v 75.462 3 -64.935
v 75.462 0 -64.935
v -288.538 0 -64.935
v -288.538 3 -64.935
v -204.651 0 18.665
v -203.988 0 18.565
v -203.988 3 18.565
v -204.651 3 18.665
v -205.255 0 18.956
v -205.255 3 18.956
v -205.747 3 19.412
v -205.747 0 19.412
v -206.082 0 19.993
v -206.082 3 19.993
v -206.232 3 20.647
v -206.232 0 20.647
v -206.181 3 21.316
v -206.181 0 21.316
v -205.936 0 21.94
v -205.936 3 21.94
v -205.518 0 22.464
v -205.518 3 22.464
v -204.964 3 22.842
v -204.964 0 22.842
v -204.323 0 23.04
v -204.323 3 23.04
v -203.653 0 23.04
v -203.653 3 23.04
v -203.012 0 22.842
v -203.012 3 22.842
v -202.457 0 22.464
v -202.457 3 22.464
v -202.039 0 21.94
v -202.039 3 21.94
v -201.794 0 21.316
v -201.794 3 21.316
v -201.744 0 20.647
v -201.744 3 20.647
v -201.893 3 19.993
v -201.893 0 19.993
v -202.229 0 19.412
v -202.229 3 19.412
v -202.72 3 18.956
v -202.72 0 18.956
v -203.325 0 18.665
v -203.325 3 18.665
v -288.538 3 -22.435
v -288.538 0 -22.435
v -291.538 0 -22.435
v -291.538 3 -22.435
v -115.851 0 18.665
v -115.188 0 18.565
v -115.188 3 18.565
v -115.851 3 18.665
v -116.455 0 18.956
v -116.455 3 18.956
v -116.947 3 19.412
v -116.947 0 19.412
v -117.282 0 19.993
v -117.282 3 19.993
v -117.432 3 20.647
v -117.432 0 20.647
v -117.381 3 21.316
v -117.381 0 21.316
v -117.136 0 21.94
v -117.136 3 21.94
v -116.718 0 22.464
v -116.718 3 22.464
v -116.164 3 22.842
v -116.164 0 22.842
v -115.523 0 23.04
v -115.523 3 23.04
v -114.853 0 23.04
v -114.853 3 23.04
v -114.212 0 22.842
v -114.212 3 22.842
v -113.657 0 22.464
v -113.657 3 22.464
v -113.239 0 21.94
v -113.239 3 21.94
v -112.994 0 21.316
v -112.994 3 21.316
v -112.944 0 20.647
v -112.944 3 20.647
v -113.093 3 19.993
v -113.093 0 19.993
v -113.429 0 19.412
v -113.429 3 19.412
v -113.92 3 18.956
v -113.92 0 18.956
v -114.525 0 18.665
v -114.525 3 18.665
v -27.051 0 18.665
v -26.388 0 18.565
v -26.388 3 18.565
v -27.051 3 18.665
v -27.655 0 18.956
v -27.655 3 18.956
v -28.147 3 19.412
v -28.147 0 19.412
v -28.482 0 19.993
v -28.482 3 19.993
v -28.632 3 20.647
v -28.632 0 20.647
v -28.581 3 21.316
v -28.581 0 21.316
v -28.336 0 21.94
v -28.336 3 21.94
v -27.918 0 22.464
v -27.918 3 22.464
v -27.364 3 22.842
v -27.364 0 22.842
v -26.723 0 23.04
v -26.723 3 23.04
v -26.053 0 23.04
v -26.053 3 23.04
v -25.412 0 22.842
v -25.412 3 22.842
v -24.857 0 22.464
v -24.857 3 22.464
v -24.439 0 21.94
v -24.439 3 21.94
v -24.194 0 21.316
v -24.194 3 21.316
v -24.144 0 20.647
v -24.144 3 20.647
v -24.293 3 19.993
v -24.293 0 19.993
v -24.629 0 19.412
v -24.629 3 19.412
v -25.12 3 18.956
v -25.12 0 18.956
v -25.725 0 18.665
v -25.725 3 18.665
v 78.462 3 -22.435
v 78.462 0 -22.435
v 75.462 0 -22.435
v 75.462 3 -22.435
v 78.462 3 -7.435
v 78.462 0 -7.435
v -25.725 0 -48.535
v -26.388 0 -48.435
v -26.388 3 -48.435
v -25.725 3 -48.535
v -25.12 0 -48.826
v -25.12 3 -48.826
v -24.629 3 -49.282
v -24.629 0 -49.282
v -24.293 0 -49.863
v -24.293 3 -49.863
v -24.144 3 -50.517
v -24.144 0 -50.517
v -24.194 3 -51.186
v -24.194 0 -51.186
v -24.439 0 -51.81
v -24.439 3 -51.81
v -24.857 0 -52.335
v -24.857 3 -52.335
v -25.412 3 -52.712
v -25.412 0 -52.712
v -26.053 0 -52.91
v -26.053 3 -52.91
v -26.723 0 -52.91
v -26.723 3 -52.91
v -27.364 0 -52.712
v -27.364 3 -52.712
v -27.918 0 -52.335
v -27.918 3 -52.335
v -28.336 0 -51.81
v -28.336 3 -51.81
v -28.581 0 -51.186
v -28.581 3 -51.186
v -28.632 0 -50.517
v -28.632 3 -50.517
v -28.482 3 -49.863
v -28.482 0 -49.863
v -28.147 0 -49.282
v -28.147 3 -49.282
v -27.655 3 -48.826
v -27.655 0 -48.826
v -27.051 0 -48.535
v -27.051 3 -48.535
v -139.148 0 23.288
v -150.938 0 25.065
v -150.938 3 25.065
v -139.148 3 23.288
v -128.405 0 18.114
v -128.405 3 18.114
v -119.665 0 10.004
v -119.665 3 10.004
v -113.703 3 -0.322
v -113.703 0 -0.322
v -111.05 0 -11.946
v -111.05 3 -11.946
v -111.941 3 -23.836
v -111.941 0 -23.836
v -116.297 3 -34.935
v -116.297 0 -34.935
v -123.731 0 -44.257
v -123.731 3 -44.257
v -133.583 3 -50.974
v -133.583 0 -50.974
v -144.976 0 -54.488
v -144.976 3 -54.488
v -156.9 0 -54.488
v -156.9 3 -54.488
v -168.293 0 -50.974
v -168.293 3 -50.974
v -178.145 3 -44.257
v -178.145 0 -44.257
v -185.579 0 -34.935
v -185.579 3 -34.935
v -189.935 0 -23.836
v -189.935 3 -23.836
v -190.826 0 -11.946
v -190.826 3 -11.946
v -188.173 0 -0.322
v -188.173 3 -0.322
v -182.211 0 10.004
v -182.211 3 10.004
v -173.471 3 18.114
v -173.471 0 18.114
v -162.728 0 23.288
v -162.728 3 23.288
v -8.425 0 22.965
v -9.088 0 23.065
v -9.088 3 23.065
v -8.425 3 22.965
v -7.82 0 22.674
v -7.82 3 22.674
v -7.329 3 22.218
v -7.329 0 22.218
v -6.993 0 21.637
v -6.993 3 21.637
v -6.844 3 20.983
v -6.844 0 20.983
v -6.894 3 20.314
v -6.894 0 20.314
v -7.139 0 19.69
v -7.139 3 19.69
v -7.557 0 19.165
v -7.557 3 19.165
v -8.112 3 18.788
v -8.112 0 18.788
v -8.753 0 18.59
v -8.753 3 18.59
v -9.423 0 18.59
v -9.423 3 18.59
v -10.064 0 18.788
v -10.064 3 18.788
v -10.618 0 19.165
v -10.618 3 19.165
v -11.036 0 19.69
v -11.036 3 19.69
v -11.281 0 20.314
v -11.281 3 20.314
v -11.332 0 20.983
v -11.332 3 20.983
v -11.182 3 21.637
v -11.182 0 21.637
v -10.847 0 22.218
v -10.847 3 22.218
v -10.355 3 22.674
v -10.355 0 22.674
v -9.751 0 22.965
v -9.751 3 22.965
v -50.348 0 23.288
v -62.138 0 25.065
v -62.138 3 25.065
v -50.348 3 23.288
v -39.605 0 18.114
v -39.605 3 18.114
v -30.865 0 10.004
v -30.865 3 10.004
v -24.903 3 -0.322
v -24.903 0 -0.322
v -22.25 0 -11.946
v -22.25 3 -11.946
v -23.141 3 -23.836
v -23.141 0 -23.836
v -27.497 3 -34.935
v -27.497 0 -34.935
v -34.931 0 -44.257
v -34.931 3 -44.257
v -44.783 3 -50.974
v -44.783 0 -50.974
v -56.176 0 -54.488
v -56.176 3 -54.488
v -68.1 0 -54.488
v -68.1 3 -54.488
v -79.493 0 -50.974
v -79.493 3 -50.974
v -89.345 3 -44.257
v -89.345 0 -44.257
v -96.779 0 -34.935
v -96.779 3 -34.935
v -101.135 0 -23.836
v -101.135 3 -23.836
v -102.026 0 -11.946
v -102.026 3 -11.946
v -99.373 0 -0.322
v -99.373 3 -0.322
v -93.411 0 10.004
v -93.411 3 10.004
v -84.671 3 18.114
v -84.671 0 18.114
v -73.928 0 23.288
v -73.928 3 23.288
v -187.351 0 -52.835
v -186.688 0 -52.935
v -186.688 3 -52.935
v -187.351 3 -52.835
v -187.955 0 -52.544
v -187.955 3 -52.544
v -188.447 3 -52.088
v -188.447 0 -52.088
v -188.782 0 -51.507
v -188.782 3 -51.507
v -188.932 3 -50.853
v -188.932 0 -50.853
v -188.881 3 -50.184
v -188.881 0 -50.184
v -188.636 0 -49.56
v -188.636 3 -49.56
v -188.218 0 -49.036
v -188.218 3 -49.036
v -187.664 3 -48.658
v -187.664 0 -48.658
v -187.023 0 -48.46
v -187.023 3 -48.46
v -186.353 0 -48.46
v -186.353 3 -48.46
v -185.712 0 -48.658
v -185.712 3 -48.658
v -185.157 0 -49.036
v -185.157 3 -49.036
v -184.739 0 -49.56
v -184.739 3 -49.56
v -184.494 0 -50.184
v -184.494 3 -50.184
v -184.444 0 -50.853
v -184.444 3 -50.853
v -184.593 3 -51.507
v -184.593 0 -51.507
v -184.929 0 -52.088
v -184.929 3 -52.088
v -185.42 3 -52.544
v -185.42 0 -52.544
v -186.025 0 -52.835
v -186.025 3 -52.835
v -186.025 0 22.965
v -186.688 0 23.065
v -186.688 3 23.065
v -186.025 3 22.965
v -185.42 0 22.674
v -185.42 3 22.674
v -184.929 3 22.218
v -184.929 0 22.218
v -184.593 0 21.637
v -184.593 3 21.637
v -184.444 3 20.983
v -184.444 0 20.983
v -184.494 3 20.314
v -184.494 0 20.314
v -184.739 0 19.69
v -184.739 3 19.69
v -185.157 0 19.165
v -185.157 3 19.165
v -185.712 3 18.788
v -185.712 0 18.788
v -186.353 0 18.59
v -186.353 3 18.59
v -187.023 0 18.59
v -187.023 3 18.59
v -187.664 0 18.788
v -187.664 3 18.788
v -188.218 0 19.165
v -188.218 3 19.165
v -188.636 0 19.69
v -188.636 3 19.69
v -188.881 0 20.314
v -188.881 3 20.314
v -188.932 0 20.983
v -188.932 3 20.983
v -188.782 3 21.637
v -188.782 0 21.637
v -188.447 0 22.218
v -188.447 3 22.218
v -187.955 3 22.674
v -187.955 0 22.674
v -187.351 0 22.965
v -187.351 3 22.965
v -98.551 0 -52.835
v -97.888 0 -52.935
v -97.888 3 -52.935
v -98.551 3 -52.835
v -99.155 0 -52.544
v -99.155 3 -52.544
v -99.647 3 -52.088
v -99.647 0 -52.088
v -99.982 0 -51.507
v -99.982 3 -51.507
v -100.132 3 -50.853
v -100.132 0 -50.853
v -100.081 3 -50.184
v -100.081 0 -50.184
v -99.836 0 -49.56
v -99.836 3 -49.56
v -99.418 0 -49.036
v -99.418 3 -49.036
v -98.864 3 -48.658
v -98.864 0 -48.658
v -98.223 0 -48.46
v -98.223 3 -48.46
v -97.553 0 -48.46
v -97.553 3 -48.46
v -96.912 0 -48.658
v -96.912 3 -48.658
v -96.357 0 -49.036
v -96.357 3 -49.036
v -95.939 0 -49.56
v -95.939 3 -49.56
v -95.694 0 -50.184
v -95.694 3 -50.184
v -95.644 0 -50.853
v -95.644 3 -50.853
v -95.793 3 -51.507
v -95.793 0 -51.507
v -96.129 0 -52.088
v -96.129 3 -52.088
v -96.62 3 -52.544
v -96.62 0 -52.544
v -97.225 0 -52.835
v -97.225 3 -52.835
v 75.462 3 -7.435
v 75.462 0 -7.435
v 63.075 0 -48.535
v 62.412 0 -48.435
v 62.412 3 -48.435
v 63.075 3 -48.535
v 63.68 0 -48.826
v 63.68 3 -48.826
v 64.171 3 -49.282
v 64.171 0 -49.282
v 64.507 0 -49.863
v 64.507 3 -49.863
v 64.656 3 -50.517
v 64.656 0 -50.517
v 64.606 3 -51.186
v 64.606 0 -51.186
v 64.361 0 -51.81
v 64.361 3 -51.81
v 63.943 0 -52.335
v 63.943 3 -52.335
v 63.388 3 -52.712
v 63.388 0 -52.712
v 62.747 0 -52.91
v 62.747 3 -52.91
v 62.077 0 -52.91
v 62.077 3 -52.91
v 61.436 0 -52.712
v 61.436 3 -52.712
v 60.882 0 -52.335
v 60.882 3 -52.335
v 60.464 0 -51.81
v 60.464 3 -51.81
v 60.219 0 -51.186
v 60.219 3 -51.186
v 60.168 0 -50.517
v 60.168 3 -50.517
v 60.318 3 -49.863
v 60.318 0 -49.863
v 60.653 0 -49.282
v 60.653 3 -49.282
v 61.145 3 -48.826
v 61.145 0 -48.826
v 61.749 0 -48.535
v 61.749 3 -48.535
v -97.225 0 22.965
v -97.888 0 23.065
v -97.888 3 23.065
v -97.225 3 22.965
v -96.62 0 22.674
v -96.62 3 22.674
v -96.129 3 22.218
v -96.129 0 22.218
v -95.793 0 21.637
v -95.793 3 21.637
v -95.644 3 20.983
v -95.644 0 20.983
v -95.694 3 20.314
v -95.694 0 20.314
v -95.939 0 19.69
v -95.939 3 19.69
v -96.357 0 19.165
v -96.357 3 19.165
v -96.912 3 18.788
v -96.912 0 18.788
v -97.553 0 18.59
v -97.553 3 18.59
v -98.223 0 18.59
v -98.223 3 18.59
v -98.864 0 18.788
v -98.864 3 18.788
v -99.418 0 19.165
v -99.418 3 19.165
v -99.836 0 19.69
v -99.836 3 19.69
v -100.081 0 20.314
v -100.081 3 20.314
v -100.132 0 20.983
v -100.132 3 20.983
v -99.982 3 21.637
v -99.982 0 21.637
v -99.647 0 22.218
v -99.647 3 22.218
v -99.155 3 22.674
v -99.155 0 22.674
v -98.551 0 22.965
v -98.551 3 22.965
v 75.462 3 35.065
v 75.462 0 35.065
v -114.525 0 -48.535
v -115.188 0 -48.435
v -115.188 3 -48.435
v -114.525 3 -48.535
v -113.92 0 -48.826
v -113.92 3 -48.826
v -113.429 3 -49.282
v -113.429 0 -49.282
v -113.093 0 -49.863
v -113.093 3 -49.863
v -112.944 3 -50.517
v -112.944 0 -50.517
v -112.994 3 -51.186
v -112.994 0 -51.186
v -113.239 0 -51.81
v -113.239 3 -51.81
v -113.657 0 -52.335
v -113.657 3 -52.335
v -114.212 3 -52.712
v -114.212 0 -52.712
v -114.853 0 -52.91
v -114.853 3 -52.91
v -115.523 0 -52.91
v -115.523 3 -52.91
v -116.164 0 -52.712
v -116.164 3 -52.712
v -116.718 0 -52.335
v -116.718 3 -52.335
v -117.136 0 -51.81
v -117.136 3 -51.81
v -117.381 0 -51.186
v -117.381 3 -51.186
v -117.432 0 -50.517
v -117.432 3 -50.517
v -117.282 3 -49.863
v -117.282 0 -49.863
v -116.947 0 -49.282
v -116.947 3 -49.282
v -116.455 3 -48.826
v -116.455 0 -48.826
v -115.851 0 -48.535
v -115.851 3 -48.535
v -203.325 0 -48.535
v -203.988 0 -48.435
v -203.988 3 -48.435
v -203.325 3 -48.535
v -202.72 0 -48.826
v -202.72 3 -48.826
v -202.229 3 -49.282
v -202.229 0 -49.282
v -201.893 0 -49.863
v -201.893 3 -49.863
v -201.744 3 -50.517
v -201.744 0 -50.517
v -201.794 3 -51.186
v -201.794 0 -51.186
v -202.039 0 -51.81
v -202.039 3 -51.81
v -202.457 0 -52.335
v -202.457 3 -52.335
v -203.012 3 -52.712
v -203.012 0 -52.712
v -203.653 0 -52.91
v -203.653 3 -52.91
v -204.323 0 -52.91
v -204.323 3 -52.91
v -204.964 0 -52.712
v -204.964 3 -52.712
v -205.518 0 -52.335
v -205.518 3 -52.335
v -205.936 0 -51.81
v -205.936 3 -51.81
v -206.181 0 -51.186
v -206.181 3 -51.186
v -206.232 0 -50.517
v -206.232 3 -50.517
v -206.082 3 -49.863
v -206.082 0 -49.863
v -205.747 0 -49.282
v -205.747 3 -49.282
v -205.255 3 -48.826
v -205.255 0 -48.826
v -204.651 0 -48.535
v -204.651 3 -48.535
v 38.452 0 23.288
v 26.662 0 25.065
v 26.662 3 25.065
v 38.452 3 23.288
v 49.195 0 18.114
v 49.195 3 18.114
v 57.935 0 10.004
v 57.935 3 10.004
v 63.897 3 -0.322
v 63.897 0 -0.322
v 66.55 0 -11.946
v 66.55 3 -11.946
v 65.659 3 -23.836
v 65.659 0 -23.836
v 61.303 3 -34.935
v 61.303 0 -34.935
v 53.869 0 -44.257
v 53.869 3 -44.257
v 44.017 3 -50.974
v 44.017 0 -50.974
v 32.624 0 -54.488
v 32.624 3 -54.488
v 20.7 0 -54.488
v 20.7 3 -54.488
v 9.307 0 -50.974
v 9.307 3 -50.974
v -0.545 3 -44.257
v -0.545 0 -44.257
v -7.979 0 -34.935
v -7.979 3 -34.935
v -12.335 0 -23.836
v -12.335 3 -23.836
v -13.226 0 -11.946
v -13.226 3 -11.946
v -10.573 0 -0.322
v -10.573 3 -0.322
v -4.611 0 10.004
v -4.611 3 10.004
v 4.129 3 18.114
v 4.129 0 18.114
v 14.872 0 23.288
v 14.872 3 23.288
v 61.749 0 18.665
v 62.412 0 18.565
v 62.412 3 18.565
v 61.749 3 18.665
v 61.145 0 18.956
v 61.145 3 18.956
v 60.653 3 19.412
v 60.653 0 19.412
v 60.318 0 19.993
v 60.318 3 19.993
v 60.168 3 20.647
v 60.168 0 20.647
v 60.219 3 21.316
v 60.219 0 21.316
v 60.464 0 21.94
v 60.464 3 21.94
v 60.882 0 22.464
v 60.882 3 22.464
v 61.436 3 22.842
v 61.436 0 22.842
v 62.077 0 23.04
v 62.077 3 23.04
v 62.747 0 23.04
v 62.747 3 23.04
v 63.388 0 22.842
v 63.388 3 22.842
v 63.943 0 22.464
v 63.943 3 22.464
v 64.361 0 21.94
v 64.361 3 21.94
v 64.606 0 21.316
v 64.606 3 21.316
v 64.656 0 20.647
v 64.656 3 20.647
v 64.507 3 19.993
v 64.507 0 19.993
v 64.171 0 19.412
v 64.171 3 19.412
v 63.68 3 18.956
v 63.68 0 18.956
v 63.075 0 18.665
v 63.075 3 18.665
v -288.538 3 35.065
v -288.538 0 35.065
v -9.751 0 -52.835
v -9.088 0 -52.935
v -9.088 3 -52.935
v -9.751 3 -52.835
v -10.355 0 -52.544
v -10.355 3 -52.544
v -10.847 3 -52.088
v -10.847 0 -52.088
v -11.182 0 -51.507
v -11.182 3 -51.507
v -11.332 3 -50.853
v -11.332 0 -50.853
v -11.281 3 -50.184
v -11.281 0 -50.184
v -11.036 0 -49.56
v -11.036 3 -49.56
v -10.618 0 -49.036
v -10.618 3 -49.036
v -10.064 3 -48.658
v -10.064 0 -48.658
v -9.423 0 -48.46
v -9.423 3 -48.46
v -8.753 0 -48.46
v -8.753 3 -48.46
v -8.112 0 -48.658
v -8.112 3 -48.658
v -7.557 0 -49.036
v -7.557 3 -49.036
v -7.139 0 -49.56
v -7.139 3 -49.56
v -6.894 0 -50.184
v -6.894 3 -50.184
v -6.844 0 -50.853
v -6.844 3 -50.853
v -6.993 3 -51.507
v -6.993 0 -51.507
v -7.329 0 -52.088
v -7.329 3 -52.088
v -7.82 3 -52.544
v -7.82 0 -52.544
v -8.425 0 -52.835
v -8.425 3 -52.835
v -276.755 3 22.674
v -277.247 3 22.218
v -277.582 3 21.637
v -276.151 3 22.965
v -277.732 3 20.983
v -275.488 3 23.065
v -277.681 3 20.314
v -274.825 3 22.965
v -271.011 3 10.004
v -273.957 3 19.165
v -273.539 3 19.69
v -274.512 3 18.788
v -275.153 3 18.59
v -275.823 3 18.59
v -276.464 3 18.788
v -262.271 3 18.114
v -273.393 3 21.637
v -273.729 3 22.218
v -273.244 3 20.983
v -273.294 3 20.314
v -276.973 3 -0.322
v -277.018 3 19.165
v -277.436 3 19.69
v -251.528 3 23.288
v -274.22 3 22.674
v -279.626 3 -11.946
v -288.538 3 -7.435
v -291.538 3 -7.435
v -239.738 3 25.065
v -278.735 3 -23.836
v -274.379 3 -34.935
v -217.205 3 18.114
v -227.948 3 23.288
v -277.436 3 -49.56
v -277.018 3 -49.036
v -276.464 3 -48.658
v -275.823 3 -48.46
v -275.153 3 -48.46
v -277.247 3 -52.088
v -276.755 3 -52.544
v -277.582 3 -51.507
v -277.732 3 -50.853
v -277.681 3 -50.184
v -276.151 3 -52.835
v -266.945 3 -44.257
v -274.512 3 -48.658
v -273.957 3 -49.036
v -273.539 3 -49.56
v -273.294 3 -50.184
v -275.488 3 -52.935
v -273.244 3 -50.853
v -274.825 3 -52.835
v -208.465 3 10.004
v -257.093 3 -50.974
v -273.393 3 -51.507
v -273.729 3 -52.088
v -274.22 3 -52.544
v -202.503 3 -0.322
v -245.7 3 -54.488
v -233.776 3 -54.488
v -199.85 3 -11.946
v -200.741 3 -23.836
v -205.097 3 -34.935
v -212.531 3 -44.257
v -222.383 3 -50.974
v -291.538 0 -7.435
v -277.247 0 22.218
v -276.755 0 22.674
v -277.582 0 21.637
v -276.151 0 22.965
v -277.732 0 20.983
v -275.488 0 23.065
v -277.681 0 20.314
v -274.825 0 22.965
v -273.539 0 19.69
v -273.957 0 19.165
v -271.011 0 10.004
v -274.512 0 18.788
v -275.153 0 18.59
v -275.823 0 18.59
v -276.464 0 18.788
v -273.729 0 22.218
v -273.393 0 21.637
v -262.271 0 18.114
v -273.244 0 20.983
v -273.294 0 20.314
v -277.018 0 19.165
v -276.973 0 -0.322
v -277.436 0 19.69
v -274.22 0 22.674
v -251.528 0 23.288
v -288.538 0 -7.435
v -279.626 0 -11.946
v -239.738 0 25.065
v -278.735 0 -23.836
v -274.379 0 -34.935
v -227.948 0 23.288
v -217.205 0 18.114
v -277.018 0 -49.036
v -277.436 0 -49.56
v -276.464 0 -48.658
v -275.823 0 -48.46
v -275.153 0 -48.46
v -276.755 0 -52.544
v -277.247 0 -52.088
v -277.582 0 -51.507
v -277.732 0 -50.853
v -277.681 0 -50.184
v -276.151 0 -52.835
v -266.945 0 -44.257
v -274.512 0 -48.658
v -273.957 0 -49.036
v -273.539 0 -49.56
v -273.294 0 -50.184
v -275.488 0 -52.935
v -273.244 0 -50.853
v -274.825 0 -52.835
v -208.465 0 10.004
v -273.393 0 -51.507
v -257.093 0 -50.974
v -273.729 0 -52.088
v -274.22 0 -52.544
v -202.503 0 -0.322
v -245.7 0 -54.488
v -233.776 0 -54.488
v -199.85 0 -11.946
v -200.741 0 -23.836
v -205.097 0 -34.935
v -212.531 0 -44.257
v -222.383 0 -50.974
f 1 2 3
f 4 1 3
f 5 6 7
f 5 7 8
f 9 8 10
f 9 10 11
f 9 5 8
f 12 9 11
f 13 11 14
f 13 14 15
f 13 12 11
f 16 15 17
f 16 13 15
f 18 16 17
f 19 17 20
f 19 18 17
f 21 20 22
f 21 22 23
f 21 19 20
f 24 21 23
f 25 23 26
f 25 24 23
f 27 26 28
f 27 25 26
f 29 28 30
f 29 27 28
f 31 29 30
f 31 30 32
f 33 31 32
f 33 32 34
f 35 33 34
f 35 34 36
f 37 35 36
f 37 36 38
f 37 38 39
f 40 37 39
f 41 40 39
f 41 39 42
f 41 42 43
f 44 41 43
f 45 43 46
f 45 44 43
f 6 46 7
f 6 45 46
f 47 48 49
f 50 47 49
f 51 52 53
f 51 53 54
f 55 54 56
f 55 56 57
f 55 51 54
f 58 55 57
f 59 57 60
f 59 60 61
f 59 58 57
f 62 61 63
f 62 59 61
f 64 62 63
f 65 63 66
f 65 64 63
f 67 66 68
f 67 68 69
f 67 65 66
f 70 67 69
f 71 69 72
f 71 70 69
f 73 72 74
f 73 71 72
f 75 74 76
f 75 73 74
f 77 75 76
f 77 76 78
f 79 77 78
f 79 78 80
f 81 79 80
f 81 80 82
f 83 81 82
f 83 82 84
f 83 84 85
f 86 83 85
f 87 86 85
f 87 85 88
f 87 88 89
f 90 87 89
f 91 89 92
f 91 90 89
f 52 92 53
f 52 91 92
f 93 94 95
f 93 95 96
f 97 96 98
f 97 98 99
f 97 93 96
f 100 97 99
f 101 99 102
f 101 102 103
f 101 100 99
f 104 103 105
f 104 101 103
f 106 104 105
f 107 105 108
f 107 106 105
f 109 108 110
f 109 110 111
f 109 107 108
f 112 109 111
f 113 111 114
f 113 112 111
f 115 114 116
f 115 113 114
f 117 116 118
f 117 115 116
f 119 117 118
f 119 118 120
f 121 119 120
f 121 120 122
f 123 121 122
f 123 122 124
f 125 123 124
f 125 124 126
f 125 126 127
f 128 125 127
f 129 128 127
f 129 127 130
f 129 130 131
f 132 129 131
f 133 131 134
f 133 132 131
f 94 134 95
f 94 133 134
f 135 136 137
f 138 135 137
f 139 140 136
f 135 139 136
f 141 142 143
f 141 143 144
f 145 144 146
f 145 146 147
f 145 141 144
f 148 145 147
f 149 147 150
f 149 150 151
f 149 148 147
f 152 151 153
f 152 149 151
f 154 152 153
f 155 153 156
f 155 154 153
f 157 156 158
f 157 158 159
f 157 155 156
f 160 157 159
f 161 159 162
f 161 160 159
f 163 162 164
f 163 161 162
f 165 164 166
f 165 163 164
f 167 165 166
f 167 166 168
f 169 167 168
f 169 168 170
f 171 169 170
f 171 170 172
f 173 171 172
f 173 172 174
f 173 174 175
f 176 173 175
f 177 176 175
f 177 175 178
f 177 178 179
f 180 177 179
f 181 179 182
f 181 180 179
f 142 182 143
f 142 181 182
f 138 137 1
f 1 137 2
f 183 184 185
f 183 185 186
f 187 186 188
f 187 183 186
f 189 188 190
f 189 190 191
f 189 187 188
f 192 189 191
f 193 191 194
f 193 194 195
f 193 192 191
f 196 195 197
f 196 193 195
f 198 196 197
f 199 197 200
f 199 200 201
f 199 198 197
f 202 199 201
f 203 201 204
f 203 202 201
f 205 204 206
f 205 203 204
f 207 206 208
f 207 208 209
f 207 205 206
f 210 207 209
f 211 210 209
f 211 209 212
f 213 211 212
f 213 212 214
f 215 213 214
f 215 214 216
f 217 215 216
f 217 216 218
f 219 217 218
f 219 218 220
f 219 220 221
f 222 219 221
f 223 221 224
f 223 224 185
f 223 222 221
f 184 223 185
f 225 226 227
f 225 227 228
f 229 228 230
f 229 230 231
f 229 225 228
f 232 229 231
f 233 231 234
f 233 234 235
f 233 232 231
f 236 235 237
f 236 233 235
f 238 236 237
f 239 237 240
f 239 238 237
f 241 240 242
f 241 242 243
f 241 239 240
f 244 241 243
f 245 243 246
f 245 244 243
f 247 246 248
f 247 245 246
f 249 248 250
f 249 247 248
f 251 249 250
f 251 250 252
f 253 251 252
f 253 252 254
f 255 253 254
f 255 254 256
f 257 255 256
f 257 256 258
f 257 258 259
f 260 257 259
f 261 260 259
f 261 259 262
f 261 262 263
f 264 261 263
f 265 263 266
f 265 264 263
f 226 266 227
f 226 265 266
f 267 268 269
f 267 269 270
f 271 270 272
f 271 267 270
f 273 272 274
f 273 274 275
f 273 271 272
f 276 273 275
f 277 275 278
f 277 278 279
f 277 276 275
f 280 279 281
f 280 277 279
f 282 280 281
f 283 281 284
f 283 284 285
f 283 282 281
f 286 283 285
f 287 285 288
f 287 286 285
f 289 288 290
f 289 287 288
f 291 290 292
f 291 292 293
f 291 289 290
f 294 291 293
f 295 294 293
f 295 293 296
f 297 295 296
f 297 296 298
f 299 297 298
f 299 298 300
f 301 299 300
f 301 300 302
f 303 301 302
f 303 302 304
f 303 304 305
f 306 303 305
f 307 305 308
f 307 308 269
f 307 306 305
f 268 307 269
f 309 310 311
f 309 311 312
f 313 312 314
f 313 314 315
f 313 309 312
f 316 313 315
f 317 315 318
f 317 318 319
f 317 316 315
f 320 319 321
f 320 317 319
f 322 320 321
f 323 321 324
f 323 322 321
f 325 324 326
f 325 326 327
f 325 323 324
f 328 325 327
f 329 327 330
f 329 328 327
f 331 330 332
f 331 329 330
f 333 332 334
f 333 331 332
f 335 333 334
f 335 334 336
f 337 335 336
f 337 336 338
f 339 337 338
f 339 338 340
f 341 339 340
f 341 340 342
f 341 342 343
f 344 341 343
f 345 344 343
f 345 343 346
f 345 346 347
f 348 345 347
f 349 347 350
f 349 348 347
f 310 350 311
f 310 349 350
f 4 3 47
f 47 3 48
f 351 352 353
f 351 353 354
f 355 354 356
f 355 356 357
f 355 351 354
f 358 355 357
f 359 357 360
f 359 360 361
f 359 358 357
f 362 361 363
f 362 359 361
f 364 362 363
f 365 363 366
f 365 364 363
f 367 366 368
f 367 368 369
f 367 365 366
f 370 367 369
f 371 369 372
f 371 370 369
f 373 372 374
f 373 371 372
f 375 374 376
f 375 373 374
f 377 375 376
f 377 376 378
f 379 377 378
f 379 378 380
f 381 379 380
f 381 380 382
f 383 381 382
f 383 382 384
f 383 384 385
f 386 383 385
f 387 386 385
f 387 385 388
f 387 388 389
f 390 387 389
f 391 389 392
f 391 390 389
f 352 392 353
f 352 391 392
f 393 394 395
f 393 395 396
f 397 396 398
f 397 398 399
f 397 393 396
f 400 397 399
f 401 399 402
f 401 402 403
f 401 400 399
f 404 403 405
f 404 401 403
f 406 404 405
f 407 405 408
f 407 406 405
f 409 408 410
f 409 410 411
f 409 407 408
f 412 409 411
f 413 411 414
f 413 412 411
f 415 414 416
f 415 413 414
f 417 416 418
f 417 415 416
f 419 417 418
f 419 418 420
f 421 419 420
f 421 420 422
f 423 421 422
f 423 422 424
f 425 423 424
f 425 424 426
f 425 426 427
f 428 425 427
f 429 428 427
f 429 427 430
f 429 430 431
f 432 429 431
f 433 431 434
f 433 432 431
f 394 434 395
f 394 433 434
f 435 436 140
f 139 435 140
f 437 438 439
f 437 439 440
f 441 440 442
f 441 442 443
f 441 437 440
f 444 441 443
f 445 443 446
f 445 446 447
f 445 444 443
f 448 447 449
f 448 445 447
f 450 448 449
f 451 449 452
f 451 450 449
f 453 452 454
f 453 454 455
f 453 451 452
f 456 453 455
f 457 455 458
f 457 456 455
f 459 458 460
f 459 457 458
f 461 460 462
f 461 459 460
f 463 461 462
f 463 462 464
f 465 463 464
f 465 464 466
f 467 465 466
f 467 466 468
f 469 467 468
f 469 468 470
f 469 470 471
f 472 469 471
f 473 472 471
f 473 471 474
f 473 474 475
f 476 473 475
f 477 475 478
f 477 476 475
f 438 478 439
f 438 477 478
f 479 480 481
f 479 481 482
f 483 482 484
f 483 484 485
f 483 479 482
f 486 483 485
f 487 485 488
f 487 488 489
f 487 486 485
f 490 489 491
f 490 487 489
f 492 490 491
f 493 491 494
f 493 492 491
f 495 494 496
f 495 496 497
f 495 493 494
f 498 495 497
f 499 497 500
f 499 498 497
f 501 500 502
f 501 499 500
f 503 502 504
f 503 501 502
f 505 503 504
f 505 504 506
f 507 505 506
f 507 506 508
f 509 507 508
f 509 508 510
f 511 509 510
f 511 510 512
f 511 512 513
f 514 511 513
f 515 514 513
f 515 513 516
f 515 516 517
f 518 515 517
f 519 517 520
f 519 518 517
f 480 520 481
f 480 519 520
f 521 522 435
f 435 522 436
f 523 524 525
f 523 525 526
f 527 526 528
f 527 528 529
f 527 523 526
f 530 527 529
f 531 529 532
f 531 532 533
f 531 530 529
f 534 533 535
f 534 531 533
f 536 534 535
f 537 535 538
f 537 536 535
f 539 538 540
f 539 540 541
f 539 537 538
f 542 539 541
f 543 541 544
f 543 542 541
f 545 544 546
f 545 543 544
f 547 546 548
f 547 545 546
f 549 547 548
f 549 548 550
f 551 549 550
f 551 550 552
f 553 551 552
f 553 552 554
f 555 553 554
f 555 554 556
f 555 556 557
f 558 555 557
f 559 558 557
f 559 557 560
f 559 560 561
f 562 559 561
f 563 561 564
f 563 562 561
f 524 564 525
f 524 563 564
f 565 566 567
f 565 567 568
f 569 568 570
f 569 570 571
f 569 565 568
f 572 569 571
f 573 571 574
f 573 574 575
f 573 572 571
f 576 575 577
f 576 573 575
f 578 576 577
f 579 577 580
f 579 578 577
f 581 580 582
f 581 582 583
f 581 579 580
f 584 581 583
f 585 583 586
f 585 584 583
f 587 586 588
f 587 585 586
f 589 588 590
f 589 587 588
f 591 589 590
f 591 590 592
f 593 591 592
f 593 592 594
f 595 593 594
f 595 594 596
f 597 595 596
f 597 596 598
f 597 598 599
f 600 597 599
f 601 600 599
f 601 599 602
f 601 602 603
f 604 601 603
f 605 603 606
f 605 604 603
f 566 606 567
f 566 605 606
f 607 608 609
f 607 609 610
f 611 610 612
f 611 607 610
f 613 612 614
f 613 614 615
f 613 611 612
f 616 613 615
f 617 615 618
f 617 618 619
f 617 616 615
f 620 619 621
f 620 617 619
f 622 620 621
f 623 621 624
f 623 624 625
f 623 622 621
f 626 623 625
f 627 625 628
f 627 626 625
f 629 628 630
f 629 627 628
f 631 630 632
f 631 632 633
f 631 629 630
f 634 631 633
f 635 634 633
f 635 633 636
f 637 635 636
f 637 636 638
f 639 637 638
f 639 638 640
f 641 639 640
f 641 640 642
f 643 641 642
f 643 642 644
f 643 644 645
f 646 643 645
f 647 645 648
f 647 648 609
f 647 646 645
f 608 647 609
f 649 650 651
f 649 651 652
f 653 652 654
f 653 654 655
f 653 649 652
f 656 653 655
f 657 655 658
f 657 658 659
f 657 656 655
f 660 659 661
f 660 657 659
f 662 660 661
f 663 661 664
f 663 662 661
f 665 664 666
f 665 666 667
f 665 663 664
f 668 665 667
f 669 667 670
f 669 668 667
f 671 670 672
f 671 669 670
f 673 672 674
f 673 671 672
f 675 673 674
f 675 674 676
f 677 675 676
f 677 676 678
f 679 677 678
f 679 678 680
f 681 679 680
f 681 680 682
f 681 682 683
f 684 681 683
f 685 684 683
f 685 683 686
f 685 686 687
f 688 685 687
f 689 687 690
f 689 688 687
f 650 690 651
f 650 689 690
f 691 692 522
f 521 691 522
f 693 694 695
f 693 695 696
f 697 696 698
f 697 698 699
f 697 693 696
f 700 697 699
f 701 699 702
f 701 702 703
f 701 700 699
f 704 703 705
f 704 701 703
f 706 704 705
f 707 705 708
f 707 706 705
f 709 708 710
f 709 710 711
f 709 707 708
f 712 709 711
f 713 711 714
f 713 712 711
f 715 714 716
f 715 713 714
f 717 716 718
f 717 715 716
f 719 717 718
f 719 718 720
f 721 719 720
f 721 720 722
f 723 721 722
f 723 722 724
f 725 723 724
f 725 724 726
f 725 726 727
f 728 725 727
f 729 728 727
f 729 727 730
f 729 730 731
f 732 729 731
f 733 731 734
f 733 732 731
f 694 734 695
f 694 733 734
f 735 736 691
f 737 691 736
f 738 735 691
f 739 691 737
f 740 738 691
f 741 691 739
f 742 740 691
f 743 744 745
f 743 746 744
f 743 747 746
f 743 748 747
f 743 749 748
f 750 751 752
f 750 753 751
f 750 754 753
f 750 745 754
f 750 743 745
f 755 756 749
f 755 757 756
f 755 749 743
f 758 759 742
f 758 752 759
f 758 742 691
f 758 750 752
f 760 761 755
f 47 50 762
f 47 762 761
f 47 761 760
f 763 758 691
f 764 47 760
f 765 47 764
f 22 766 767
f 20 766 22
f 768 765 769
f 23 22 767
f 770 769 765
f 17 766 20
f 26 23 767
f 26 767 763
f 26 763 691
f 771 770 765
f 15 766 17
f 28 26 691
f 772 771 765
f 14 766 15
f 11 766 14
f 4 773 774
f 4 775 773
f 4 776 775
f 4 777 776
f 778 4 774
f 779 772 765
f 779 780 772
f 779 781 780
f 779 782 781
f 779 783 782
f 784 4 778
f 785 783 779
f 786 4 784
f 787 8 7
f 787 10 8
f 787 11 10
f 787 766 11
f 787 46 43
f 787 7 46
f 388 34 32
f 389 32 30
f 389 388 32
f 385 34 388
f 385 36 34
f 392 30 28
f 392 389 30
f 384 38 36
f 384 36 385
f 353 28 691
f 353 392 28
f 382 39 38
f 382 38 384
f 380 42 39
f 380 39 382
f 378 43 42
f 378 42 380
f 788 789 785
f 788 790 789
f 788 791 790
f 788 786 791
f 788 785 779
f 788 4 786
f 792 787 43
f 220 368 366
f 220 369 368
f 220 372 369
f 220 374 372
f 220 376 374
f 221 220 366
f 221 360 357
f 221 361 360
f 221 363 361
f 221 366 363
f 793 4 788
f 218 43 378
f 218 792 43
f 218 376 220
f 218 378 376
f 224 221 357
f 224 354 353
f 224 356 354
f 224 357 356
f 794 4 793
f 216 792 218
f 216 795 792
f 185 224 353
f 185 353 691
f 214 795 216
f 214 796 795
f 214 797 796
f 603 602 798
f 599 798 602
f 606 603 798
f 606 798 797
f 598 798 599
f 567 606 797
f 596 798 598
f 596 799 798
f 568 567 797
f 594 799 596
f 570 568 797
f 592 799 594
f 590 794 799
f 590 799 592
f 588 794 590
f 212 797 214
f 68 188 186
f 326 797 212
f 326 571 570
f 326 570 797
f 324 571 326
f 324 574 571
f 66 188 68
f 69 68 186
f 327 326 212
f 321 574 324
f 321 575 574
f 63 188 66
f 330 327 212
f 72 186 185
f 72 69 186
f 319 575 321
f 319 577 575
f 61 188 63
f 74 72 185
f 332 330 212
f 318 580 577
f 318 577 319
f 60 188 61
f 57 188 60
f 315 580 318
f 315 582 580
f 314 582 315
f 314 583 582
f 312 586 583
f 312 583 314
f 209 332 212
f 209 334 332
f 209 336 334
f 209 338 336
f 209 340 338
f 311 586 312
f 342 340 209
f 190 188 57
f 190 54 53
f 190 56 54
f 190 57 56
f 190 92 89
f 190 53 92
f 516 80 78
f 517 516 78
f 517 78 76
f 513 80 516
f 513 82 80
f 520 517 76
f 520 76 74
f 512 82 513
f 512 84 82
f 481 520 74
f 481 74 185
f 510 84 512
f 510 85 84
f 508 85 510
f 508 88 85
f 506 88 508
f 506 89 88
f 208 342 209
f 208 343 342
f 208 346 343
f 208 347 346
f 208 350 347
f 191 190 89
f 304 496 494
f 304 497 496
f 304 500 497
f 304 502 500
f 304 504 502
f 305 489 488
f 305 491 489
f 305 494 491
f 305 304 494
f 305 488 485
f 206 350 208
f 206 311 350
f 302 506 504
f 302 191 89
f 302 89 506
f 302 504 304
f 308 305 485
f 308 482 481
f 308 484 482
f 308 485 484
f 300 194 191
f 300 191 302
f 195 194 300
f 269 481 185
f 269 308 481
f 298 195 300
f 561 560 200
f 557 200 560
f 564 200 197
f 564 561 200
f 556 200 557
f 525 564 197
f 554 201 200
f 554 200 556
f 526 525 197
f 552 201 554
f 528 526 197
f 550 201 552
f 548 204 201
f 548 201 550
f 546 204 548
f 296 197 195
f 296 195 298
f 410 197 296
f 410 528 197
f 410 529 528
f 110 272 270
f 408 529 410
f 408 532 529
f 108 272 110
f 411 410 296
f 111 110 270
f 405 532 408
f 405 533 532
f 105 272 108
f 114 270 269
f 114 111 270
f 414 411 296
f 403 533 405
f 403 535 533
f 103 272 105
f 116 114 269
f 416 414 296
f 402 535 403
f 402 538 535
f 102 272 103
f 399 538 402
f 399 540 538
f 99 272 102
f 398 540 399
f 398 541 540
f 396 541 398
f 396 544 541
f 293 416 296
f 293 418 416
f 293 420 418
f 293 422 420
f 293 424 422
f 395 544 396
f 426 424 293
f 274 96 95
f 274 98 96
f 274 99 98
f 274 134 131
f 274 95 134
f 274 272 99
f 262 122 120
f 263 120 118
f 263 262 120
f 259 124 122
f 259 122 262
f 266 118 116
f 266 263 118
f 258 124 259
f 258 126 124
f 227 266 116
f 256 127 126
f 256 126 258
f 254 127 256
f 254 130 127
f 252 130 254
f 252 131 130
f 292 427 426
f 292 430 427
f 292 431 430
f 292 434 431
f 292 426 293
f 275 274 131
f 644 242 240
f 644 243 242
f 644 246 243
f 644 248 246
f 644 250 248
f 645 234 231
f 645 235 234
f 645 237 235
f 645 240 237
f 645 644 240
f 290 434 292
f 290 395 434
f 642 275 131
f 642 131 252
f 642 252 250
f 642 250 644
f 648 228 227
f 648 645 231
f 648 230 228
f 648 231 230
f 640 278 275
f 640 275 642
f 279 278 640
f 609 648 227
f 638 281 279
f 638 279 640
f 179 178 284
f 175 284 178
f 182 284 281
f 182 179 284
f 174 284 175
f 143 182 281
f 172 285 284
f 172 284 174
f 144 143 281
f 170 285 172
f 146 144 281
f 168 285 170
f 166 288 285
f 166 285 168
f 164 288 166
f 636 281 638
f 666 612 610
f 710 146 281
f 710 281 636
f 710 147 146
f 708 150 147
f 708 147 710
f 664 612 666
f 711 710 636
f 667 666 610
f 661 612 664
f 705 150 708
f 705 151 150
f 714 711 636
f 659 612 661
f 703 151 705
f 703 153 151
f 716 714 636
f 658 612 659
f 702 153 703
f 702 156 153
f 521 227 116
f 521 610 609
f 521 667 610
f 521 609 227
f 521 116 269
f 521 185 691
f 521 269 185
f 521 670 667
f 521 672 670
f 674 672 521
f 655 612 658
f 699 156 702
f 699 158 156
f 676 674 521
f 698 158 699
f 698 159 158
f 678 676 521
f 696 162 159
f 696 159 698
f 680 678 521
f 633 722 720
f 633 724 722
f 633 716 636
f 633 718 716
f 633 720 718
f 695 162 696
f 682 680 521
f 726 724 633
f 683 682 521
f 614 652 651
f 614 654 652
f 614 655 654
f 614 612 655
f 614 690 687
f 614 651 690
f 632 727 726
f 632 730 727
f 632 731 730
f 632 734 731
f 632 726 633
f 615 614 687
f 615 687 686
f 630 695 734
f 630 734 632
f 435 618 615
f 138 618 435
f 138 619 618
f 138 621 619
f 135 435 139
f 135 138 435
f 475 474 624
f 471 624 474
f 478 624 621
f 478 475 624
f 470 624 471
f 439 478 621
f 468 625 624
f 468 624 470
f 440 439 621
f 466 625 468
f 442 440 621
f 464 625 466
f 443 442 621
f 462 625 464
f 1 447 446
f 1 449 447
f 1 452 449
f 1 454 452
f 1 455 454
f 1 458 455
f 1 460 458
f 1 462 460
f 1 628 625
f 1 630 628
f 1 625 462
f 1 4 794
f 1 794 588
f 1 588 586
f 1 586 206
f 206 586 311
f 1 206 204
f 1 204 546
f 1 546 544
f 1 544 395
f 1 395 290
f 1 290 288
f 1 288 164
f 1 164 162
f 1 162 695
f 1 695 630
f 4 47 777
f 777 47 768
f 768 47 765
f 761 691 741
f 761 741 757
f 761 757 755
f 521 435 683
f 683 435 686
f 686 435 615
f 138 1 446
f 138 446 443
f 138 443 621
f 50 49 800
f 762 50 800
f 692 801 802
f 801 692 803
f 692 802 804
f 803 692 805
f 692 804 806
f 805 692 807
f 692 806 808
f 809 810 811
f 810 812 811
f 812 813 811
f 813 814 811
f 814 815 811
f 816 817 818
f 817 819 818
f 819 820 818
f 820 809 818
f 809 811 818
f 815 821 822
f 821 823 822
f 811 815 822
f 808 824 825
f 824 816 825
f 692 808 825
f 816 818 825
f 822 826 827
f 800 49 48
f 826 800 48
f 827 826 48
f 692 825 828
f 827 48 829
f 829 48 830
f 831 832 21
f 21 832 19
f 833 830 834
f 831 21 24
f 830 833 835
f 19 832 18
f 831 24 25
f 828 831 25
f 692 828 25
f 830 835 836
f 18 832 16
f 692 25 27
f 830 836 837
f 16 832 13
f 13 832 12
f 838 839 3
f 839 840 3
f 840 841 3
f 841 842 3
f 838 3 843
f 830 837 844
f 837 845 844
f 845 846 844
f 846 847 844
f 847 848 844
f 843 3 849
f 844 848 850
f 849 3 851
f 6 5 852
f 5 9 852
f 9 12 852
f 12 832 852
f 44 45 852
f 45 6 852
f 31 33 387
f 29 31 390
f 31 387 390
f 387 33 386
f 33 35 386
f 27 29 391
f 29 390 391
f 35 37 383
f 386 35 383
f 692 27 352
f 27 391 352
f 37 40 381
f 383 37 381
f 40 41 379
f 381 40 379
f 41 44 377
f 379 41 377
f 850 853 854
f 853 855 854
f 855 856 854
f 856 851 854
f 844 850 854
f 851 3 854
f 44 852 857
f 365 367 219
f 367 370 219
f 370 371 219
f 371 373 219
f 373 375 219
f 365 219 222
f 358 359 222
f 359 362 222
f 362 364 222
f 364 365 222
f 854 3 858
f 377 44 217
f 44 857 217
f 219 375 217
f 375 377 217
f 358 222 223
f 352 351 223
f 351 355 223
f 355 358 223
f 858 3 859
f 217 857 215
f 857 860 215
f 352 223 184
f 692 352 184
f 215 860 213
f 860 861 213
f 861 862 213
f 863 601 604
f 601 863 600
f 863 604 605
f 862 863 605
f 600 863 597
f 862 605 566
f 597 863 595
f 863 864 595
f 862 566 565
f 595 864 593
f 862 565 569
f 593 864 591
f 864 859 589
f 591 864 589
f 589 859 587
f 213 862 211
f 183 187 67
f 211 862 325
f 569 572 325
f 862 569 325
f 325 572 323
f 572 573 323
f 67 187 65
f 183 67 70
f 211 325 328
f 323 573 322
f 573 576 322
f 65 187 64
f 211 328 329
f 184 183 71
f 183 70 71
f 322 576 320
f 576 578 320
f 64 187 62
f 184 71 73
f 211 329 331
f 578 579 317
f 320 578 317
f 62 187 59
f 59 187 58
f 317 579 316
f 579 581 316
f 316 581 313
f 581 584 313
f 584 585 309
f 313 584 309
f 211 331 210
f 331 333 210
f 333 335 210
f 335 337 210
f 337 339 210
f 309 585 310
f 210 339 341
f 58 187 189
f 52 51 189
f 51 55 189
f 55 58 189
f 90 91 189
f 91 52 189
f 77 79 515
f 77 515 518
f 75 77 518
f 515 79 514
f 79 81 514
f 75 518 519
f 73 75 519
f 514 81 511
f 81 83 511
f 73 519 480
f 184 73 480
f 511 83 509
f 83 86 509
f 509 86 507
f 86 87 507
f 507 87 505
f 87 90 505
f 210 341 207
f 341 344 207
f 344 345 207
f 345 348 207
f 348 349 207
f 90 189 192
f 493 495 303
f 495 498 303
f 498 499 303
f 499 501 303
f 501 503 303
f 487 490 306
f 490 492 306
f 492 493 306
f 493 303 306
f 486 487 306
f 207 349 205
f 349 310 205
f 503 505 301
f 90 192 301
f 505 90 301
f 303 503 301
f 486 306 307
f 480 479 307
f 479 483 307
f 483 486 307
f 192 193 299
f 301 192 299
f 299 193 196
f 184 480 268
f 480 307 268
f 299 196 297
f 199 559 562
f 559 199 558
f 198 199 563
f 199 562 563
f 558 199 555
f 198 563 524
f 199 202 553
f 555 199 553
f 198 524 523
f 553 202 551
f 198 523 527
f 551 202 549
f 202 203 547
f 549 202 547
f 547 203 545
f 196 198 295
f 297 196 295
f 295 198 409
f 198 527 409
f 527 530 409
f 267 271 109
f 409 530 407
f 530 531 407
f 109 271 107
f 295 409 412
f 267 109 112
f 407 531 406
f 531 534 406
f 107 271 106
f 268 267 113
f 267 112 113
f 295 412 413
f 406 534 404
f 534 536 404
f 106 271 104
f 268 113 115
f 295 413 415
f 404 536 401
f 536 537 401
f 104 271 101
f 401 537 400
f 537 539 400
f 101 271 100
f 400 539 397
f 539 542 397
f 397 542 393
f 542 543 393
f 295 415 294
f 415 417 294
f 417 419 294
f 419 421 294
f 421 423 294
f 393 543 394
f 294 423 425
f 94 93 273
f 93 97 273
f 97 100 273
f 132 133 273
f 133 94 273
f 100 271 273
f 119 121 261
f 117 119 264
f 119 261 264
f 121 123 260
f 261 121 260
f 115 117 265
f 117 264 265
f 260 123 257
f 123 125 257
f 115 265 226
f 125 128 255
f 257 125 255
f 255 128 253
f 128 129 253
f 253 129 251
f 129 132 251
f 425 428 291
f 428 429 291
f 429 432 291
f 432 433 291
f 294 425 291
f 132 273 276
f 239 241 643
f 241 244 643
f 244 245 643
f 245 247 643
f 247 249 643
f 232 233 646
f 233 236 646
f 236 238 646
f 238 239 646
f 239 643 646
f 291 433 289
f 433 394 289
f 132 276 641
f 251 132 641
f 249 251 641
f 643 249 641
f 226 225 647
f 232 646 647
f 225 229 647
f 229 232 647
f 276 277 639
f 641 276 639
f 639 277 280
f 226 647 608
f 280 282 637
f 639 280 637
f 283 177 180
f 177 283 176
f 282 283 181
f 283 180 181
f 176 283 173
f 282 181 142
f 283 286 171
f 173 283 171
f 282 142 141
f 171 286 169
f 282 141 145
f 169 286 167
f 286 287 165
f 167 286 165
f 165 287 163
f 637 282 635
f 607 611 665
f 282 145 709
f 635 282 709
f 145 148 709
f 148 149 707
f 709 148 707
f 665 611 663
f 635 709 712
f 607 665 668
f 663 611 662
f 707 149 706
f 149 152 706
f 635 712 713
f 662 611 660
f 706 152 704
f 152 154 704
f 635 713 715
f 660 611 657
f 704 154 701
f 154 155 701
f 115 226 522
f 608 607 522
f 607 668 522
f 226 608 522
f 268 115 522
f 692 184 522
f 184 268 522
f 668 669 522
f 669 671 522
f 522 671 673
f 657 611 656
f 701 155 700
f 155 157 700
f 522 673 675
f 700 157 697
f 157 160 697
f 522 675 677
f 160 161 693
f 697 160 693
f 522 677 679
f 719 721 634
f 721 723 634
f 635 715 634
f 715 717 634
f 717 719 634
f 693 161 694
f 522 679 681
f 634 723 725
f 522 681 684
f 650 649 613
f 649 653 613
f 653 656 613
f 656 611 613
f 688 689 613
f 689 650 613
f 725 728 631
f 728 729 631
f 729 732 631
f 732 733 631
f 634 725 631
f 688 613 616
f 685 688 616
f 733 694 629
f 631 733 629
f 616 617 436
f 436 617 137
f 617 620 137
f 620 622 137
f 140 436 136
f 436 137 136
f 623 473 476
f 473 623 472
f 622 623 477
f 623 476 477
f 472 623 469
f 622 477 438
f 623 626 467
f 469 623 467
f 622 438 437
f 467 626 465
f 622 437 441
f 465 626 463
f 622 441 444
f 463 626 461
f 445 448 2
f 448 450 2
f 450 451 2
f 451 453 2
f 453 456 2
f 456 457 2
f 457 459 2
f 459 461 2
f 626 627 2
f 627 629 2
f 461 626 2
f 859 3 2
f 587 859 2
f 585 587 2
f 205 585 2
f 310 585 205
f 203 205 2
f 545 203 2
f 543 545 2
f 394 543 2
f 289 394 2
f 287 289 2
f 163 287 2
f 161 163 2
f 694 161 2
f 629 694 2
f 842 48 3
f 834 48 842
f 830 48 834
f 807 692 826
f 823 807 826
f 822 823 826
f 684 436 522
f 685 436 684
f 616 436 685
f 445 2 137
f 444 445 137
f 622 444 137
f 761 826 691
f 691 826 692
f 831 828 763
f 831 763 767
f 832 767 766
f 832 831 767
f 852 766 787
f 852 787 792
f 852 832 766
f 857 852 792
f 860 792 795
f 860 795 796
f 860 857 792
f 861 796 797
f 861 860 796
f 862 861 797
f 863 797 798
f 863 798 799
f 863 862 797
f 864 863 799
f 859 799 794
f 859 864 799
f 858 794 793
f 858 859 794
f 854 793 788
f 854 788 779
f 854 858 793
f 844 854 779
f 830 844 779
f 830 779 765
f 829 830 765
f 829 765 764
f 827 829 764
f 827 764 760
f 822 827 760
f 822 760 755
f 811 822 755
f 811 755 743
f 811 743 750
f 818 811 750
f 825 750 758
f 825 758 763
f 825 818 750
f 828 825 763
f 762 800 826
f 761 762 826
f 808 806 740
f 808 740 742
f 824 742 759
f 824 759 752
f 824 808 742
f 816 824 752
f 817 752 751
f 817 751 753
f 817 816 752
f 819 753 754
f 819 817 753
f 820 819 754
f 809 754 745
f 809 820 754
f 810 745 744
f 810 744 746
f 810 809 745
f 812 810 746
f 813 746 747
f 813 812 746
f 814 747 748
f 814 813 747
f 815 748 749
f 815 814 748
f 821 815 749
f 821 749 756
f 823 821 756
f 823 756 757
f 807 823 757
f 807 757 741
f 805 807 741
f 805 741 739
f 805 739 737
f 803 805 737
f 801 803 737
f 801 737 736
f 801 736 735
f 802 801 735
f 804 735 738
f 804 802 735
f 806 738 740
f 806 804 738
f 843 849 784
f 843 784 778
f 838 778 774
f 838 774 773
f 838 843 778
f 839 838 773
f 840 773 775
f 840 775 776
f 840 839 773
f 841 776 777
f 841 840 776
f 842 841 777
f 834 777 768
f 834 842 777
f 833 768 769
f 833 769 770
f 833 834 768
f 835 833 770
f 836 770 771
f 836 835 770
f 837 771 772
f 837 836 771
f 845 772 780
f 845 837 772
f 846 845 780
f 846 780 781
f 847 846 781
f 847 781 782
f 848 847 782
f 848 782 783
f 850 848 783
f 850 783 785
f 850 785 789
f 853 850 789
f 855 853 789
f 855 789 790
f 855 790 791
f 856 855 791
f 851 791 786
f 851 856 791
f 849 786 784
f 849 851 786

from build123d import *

# Parameters (mm, degrees)
SKETCH1_R           = 40
SKETCH1_R_2         = 2.25
BOSS_EXTRUDE1_DEPTH = 3


with BuildPart() as part:
    # Sketch1 → Boss-Extrude1 (new body)
    with BuildSketch(Plane(origin=(0, 0, 0), x_dir=(1, 0, 0), z_dir=(0, 1, 0))):
        Polygon((75.462130999, 64.93515636), (-288.537869001, 64.93515636), (-288.537869001, 22.43515636), (-291.537869001, 22.43515636), (-291.537869001, 7.43515636), (-288.537869001, 7.43515636), (-288.537869001, -35.06484364), (75.462130999, -35.06484364), (75.462130999, 7.43515636), (78.462130999, 7.43515636), (78.462130999, 22.43515636), (75.462130999, 22.43515636), align=None)
        with Locations(Location((-239.737869001, 14.93515636, 0), (0, 0, 270))):
            Circle(SKETCH1_R, mode=Mode.SUBTRACT)
        with Locations(Location((-203.987869001, 50.68515636, 0), (0, 0, 270))):
            Circle(SKETCH1_R_2, mode=Mode.SUBTRACT)
        with Locations(Location((-203.987869001, -20.81484364, 0), (0, 0, 90))):
            Circle(SKETCH1_R_2, mode=Mode.SUBTRACT)
        with Locations(Location((-275.487869001, -20.81484364, 0), (0, 0, 270))):
            Circle(SKETCH1_R_2, mode=Mode.SUBTRACT)
        with Locations(Location((-275.487869001, 50.68515636, 0), (0, 0, 90))):
            Circle(SKETCH1_R_2, mode=Mode.SUBTRACT)
        with Locations(Location((-186.687869001, 50.68515636, 0), (0, 0, 90))):
            Circle(SKETCH1_R_2, mode=Mode.SUBTRACT)
        with Locations(Location((-150.937869001, 14.93515636, 0), (0, 0, 270))):
            Circle(SKETCH1_R, mode=Mode.SUBTRACT)
        with Locations(Location((-115.187869001, 50.68515636, 0), (0, 0, 270))):
            Circle(SKETCH1_R_2, mode=Mode.SUBTRACT)
        with Locations(Location((-186.687869001, -20.81484364, 0), (0, 0, 270))):
            Circle(SKETCH1_R_2, mode=Mode.SUBTRACT)
        with Locations(Location((-115.187869001, -20.81484364, 0), (0, 0, 90))):
            Circle(SKETCH1_R_2, mode=Mode.SUBTRACT)
        with Locations(Location((-97.887869001, 50.68515636, 0), (0, 0, 90))):
            Circle(SKETCH1_R_2, mode=Mode.SUBTRACT)
        with Locations(Location((-62.137869001, 14.93515636, 0), (0, 0, 270))):
            Circle(SKETCH1_R, mode=Mode.SUBTRACT)
        with Locations(Location((-26.387869001, 50.68515636, 0), (0, 0, 270))):
            Circle(SKETCH1_R_2, mode=Mode.SUBTRACT)
        with Locations(Location((-97.887869001, -20.81484364, 0), (0, 0, 270))):
            Circle(SKETCH1_R_2, mode=Mode.SUBTRACT)
        with Locations(Location((-26.387869001, -20.81484364, 0), (0, 0, 90))):
            Circle(SKETCH1_R_2, mode=Mode.SUBTRACT)
        with Locations(Location((-9.087869001, 50.68515636, 0), (0, 0, 90))):
            Circle(SKETCH1_R_2, mode=Mode.SUBTRACT)
        with Locations(Location((26.662130999, 14.93515636, 0), (0, 0, 270))):
            Circle(SKETCH1_R, mode=Mode.SUBTRACT)
        with Locations(Location((62.412130999, 50.68515636, 0), (0, 0, 270))):
            Circle(SKETCH1_R_2, mode=Mode.SUBTRACT)
        with Locations(Location((-9.087869001, -20.81484364, 0), (0, 0, 270))):
            Circle(SKETCH1_R_2, mode=Mode.SUBTRACT)
        with Locations(Location((62.412130999, -20.81484364, 0), (0, 0, 90))):
            Circle(SKETCH1_R_2, mode=Mode.SUBTRACT)
    extrude(amount=BOSS_EXTRUDE1_DEPTH)


solid = part.part
